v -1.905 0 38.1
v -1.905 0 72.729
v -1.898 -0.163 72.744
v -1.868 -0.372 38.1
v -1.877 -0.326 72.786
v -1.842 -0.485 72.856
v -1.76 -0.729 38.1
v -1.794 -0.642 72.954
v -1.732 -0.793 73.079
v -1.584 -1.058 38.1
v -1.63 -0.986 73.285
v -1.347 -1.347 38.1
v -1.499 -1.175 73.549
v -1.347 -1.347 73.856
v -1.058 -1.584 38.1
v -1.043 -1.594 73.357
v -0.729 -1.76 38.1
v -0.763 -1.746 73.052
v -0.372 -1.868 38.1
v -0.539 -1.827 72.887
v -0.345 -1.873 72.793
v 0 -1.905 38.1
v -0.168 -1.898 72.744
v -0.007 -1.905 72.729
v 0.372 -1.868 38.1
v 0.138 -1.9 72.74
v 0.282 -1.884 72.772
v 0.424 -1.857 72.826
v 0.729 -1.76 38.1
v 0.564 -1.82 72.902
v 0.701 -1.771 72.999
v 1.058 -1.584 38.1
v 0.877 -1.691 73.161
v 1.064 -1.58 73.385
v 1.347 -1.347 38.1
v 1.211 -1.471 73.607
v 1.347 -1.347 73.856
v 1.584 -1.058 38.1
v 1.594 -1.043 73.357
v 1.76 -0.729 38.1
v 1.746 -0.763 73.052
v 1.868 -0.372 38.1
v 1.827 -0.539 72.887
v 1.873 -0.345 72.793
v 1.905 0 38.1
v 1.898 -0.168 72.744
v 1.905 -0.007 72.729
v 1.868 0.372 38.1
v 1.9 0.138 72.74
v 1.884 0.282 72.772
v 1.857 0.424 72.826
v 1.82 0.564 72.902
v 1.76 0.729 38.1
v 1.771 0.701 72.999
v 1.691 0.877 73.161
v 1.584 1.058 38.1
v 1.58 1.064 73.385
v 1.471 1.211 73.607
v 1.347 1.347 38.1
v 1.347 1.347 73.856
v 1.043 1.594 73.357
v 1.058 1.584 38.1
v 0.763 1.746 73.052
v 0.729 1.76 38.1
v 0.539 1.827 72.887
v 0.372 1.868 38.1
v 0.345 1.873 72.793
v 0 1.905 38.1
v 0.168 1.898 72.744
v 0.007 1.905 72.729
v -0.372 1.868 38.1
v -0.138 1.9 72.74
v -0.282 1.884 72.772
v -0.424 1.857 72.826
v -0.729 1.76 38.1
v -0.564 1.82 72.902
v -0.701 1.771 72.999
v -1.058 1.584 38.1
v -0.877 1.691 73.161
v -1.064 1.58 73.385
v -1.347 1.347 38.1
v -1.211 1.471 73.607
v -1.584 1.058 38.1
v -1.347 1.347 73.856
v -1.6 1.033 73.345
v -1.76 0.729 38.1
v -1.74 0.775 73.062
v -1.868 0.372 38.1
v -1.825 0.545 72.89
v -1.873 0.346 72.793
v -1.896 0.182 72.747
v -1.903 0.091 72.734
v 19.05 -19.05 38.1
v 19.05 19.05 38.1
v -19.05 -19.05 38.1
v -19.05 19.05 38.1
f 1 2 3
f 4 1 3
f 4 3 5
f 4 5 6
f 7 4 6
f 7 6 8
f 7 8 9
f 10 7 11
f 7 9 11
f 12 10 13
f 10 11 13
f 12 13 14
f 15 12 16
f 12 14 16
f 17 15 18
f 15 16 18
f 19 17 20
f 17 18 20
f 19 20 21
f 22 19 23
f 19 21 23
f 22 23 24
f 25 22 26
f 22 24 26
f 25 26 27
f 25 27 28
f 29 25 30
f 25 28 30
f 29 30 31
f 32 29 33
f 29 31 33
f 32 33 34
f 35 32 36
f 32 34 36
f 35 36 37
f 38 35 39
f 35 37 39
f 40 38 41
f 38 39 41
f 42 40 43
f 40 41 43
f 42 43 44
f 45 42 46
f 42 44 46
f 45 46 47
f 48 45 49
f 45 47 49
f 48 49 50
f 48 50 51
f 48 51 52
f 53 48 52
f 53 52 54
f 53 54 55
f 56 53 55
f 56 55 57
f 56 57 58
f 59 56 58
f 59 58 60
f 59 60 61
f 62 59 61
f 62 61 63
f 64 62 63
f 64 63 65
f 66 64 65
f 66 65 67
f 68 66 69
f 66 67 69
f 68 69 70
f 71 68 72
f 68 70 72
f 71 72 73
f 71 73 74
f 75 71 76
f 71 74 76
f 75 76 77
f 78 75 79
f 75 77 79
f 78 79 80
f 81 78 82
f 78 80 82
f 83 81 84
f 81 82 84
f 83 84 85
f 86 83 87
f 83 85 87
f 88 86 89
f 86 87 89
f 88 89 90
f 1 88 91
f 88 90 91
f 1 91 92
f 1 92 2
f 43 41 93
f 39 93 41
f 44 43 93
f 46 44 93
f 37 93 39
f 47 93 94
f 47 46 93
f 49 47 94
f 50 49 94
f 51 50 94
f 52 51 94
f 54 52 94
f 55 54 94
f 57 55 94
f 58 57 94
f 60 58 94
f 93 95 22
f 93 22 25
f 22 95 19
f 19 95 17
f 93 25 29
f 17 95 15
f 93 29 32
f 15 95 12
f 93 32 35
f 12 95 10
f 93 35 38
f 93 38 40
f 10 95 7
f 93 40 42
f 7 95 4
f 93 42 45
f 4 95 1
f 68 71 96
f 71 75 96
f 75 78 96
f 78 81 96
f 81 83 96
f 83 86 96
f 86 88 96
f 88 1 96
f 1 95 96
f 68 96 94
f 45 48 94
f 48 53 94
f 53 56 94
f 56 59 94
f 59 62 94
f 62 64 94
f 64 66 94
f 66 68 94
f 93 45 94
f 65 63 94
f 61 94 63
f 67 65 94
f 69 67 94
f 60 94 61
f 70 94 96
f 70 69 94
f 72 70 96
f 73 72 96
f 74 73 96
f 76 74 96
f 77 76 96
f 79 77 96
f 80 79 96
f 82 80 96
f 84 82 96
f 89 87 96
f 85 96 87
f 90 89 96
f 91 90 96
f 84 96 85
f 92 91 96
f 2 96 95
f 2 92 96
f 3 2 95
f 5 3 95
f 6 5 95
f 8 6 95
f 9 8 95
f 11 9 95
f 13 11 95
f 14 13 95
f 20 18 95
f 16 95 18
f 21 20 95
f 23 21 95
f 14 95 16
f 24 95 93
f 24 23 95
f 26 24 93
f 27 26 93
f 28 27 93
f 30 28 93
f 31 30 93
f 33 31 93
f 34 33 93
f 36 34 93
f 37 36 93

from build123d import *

# Parameters (mm, degrees)
F0_W  = 76.2
F0_H  = 76.2
F2_W  = 38.1
F2_H  = 38.1
F4_W  = 38.1
F4_H  = 38.1
F8_D  = 3.81
F10_D = 3.81


with BuildPart() as f3:
    # F0 (on Top) → F3 section 0
    with BuildSketch(Plane.XY):
        Rectangle(F0_W, F0_H)
    # F2 (on offset) → F3 section 1
    with BuildSketch(Plane.XY.offset(38.1)):
        Rectangle(F2_W, F2_H)
    loft()

    # F10 (through all)
    with Locations(Plane.XY.offset(38.1)):
        with Locations((0, 0)):
            Hole(F10_D / 2)


with BuildPart() as f6:
    # F4 (on offset) → F6 section 0
    with BuildSketch(Plane.XY.offset(38.1), mode=Mode.PRIVATE) as f6_s0:
        Rectangle(F4_W, F4_H)
    loft([f6_s0.sketch, Vertex(0, 0, 76.5771791339)])

    # F8 (through all)
    with Locations(Plane(origin=(0, 0, 38.1), x_dir=(1, 0, 0), z_dir=(0, 0, -1))):
        with Locations((0, 0)):
            Hole(F8_D / 2)


solid = f6.part
